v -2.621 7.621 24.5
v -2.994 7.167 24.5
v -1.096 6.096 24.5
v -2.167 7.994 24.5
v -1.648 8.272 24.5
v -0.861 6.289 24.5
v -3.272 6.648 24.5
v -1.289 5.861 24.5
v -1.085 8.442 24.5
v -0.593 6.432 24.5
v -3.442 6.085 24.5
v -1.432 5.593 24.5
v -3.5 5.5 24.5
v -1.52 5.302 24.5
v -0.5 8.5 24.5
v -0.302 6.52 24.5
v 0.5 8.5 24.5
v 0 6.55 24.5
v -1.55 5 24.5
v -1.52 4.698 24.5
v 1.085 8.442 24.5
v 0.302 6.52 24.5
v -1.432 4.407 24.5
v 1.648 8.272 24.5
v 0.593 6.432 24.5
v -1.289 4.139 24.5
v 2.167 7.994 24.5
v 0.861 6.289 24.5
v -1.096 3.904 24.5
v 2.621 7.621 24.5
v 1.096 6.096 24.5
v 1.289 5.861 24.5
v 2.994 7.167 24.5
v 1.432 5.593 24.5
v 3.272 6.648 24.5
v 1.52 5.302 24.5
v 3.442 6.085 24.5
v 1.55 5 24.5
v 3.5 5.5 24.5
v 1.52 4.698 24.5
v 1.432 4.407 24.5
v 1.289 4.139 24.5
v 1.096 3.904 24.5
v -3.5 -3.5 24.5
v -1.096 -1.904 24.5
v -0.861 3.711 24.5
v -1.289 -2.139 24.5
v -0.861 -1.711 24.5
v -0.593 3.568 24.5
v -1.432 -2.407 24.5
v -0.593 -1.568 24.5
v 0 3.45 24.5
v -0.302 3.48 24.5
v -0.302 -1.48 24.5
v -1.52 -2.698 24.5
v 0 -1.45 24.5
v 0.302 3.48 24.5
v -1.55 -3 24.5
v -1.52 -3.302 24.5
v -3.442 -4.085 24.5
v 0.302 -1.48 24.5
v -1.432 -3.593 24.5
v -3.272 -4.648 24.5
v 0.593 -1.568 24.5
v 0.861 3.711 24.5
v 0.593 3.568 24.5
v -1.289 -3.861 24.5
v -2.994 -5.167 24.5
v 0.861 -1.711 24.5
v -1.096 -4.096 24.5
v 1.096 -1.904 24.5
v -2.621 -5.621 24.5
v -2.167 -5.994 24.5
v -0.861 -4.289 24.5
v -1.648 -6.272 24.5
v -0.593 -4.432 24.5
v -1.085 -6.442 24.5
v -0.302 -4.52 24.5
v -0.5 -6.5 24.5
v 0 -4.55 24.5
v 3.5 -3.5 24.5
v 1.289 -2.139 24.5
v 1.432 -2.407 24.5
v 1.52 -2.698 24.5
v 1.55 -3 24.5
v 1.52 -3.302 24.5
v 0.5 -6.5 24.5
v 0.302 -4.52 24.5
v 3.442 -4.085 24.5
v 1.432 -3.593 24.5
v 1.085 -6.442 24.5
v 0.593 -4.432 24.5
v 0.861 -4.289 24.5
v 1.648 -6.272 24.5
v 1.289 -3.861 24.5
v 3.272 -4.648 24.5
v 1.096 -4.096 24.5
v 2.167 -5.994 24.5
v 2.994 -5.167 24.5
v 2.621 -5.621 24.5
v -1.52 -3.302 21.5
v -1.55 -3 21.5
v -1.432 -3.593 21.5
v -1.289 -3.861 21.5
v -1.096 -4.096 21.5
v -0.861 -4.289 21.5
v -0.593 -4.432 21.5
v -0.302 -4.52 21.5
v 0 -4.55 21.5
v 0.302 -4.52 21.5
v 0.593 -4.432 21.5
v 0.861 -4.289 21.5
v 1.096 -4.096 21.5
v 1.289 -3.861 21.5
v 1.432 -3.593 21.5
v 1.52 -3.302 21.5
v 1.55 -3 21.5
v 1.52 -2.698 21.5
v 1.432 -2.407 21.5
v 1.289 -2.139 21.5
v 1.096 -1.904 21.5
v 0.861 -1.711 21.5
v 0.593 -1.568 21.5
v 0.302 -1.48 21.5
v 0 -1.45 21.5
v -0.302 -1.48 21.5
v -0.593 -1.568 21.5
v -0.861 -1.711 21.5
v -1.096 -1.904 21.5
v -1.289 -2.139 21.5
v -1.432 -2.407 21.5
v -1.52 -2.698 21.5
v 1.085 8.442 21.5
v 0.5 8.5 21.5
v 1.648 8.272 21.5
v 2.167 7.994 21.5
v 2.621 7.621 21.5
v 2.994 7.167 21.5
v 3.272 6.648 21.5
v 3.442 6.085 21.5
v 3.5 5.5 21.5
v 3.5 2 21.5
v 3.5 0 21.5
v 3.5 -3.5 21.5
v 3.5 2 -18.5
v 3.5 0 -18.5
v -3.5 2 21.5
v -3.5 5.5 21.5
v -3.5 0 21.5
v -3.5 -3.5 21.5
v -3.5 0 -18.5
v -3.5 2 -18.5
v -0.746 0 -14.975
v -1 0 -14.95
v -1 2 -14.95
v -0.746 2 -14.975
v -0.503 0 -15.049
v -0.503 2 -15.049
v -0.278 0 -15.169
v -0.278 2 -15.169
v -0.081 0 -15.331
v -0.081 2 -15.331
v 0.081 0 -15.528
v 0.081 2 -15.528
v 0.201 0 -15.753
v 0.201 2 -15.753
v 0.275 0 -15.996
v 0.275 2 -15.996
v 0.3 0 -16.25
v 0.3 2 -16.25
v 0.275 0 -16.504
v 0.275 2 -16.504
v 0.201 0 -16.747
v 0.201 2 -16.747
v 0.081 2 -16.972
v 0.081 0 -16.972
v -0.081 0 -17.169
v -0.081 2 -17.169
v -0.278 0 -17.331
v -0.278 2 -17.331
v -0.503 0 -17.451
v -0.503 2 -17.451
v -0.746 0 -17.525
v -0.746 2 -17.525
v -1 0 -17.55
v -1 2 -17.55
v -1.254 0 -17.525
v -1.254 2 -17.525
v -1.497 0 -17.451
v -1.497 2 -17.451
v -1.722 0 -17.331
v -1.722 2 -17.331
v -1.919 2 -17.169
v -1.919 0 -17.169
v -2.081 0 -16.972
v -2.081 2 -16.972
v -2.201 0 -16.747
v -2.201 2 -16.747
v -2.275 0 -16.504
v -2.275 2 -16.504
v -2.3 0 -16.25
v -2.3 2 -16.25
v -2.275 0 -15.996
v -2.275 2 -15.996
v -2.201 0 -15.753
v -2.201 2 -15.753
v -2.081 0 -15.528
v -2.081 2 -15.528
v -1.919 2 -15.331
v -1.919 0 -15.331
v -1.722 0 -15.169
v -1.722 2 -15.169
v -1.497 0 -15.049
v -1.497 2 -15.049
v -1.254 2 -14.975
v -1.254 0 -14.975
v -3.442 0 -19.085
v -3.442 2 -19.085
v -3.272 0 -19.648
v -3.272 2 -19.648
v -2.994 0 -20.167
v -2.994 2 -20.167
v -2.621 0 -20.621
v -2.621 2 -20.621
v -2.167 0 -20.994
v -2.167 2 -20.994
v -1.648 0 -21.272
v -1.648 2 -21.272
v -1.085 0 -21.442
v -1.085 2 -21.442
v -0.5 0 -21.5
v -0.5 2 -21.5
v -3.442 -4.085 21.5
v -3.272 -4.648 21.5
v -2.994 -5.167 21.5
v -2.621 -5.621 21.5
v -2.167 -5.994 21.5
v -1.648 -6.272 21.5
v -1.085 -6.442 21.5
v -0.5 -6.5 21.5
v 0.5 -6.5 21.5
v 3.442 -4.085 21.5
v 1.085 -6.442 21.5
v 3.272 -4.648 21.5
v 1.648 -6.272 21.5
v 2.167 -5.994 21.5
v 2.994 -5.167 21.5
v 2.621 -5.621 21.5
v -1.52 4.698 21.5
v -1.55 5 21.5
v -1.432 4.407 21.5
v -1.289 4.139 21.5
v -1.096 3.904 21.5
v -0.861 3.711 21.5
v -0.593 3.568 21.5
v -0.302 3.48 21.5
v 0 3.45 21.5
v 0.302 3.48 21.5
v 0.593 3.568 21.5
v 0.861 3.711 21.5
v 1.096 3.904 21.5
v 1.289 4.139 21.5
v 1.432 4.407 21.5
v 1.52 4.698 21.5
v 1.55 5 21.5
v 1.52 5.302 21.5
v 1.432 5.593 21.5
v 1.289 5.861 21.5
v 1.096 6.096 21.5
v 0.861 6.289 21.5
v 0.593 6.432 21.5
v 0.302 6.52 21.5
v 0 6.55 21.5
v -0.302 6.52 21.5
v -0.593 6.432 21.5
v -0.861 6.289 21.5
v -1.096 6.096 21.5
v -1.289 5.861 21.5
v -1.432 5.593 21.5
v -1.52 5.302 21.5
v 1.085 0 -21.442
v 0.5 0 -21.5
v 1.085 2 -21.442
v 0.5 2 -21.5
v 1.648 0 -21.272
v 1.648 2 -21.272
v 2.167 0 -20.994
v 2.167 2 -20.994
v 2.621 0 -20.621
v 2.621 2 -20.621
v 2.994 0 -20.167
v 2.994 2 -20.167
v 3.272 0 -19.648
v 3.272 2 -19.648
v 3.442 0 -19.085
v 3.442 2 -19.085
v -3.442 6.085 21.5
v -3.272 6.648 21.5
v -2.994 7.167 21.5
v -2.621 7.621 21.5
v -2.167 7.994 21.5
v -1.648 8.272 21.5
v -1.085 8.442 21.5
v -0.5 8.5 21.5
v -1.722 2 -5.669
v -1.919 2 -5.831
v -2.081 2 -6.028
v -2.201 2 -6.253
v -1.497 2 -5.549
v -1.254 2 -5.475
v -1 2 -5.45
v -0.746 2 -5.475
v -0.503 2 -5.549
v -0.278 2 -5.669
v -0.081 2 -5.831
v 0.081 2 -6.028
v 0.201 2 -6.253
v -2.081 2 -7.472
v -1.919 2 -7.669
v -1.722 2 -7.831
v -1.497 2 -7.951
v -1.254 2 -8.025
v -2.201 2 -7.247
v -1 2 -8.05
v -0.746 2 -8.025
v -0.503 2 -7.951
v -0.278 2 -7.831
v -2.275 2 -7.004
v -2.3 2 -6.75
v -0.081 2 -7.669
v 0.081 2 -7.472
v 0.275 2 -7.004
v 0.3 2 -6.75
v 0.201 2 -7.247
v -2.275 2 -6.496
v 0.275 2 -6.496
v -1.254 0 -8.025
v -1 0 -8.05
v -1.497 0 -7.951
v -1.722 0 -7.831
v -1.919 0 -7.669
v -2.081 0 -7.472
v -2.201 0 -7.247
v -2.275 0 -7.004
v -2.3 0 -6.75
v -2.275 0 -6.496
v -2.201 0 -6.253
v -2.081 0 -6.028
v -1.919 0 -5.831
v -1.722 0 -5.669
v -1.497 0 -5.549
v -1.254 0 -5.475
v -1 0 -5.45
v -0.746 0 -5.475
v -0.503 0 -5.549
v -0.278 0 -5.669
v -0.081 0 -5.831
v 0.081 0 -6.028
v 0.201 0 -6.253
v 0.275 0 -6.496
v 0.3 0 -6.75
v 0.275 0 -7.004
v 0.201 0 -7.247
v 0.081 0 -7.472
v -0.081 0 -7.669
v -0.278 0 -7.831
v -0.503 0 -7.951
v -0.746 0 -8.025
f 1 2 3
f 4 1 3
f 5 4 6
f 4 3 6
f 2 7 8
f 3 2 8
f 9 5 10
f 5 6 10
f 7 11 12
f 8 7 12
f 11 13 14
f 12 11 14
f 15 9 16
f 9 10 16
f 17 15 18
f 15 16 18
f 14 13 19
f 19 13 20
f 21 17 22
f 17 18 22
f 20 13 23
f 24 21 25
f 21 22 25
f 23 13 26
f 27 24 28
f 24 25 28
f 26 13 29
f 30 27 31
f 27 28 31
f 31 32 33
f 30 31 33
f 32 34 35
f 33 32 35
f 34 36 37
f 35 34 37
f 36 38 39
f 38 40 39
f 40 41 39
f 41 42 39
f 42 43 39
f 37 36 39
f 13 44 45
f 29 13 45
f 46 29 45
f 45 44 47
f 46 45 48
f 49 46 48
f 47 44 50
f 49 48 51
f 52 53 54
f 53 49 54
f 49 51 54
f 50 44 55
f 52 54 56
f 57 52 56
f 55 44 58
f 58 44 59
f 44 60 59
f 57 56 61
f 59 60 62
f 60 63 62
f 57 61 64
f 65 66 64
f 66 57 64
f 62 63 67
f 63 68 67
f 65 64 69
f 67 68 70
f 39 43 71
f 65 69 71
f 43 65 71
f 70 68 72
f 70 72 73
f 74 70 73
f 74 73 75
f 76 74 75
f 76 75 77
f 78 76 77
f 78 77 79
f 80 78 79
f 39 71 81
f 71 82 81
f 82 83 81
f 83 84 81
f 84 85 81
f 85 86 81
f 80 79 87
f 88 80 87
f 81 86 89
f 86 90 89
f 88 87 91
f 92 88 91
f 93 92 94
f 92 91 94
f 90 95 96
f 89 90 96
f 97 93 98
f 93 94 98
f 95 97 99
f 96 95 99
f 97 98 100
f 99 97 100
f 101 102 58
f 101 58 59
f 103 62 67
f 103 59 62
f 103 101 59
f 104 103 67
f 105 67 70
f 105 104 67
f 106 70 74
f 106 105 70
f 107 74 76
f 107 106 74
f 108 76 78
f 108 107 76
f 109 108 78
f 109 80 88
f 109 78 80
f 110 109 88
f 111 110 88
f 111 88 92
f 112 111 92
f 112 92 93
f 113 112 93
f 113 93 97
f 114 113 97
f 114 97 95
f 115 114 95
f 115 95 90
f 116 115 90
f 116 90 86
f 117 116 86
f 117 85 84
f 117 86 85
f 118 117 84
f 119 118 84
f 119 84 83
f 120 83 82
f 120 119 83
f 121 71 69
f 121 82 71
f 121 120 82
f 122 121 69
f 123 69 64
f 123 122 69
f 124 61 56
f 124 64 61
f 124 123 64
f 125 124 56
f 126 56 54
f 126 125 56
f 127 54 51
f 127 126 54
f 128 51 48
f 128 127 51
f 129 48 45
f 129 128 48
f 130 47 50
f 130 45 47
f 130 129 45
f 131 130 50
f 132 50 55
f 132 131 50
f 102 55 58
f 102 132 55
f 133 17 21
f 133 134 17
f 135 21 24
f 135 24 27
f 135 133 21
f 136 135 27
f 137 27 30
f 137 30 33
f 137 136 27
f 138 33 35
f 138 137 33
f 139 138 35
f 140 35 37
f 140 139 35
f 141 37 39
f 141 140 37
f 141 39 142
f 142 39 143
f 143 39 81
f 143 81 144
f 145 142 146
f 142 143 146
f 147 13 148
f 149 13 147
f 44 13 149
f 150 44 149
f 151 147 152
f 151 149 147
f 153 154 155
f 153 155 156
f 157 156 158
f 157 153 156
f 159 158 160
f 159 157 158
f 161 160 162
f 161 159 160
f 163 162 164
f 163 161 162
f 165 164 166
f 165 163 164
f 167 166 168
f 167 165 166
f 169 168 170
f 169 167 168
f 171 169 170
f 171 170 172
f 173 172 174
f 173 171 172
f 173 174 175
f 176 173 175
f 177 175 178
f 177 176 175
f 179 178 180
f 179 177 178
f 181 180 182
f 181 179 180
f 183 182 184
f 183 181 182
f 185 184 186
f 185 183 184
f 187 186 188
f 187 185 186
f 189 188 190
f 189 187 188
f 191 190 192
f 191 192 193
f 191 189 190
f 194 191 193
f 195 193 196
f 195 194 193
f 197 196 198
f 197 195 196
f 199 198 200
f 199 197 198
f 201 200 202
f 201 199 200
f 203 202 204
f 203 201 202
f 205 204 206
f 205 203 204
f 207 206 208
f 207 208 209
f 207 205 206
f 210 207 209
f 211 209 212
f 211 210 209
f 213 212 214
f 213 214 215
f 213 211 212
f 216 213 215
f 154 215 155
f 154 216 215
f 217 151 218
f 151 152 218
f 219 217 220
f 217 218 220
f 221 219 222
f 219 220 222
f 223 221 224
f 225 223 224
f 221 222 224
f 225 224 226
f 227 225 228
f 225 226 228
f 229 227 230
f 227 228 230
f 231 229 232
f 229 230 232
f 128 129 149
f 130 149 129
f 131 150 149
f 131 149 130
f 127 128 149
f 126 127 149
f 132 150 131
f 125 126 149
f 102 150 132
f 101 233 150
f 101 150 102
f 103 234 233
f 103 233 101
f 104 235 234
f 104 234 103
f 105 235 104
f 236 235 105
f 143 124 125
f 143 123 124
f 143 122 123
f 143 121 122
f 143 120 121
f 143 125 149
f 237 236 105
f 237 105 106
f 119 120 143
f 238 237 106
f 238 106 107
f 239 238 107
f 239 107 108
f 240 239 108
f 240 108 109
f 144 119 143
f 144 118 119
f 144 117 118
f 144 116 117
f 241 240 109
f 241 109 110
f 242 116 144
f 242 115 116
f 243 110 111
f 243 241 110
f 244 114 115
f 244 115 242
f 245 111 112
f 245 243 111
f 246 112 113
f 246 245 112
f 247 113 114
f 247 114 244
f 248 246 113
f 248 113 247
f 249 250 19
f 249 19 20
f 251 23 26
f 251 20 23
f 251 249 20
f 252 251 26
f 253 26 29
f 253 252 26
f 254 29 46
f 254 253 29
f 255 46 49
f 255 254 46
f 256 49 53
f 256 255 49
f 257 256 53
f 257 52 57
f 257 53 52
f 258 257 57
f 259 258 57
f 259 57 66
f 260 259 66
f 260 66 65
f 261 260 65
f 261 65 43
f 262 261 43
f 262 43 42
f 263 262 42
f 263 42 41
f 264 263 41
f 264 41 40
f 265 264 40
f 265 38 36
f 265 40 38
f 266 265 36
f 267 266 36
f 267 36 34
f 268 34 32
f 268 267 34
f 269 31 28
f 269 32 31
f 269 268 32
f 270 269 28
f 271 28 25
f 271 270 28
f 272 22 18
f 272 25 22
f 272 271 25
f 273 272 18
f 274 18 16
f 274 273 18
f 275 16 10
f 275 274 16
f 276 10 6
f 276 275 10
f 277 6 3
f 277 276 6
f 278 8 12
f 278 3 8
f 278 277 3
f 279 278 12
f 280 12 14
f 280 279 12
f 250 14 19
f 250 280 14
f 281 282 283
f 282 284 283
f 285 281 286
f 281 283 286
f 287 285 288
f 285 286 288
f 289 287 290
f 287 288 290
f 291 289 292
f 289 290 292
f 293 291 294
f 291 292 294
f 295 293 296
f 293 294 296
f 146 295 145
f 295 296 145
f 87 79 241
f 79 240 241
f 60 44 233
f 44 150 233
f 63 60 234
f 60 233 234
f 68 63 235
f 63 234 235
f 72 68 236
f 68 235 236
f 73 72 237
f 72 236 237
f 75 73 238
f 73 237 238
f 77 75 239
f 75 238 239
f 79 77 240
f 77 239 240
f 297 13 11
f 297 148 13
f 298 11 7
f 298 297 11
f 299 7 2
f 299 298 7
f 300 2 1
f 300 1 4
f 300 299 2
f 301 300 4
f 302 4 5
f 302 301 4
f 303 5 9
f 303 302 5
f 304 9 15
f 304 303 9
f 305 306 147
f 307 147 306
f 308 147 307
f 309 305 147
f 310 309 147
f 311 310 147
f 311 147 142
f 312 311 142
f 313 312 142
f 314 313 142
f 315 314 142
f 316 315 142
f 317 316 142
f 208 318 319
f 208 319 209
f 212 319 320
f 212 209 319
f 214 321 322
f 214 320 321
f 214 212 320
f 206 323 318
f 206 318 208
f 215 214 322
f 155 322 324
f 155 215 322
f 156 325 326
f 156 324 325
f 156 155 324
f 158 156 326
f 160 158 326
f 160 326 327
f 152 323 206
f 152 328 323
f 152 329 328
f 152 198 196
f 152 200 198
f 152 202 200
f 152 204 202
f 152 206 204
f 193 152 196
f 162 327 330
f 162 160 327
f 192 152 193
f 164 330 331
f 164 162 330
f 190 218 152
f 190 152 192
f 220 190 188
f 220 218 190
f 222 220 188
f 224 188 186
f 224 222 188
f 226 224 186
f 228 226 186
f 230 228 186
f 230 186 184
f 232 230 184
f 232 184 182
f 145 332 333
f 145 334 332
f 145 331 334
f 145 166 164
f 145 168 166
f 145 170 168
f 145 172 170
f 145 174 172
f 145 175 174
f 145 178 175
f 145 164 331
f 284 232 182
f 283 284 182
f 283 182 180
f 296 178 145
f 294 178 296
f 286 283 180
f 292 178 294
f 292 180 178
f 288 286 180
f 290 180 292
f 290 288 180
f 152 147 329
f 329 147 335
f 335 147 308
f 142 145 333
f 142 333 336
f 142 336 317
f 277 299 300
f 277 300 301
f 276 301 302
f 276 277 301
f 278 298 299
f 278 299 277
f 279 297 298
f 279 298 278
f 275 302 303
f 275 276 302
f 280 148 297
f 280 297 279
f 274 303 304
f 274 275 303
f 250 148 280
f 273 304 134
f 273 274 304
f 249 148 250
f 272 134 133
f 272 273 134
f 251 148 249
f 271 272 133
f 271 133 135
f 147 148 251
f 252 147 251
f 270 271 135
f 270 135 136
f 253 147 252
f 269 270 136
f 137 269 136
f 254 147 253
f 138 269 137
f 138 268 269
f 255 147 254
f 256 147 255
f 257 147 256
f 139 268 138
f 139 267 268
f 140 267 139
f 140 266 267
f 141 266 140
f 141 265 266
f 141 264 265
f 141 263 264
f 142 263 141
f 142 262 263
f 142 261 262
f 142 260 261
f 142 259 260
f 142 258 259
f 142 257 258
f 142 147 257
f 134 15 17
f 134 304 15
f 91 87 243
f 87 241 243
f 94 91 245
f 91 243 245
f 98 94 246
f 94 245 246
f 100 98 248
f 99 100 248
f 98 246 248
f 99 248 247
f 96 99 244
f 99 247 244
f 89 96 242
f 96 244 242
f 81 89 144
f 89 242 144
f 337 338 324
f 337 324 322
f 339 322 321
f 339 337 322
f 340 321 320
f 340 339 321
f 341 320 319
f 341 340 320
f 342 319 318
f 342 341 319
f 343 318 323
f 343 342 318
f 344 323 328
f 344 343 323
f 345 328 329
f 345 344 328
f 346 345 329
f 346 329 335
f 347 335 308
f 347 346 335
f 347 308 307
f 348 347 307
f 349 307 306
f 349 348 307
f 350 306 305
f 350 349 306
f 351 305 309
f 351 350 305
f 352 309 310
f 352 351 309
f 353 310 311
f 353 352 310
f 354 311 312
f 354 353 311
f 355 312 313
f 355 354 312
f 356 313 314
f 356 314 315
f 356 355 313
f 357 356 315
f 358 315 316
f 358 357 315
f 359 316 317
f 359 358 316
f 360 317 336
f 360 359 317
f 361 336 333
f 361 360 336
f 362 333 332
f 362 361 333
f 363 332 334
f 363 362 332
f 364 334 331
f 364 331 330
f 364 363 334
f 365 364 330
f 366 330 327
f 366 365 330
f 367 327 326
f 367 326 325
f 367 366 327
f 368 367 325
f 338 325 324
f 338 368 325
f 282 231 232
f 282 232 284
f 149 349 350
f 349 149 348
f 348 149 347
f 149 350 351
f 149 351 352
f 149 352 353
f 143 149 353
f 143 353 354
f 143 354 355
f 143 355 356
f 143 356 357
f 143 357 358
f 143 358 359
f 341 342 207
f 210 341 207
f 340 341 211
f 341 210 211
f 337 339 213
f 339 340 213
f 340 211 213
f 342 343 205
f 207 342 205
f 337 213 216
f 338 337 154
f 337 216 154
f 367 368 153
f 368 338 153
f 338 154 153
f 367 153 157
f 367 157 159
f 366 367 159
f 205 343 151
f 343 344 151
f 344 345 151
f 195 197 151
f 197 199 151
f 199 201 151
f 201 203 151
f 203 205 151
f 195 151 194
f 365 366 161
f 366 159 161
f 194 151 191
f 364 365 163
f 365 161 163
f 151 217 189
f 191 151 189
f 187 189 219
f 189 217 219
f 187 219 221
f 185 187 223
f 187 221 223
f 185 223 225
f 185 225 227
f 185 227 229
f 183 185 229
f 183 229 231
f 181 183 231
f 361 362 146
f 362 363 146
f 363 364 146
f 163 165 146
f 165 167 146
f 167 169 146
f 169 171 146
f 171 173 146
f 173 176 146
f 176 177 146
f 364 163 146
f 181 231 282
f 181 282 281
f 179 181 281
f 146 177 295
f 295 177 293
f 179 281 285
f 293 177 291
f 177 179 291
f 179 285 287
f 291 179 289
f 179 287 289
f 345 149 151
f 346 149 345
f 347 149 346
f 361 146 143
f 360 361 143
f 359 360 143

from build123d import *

# Parameters (mm, degrees)
SKETCH_1_W           = 7
SKETCH_1_H           = 43
SKETCH_1_R           = 1.3
EXTRUDE_1_DEPTH      = 2
EXTRUDE_2_DEPTH      = 8.5
EXTRUDE_2_DEPTH_BACK = 6.5
SKETCH_2_W           = 7
SKETCH_2_H           = 3
SKETCH_3_R           = 1.55
CUT_EXTRUDE_1_DEPTH  = 27.167728216
FILLET_1_R           = 3
FILLET_2_R           = 3


with BuildPart() as part:
    # 草图1 → 凸台-拉伸1 (new body)
    with BuildSketch(Plane(origin=(0, 0, 0), x_dir=(1, 0, 0), z_dir=(0, 1, 0))):
        Rectangle(SKETCH_1_W, SKETCH_1_H)
        with Locations(Location((-1, 16.25, 0), (0, 0, 270))):
            Circle(SKETCH_1_R, mode=Mode.SUBTRACT)
        with Locations(Location((-1, 6.75, 0), (0, 0, 90))):
            Circle(SKETCH_1_R, mode=Mode.SUBTRACT)
    extrude(amount=EXTRUDE_1_DEPTH)

    # 草图2 → 凸台-拉伸2 (add, two sides: drawn at the far end of the back side and taken through both)
    with BuildSketch(Plane(origin=(0, 0, 0), x_dir=(1, 0, 0), z_dir=(0, 1, 0)).offset(-EXTRUDE_2_DEPTH_BACK)):
        with Locations((0, -23)):
            Rectangle(SKETCH_2_W, SKETCH_2_H)
    extrude(amount=EXTRUDE_2_DEPTH + EXTRUDE_2_DEPTH_BACK)

    # 草图3 → 切除-拉伸1 (cut, through all)
    with BuildSketch(Plane.XY):
        with Locations(Location((0, 5, 0), (0, 0, 180))):
            Circle(SKETCH_3_R)
        with Locations(Location((0, -3, 0), (0, 0, 180))):
            Circle(SKETCH_3_R)
    extrude(amount=CUT_EXTRUDE_1_DEPTH, mode=Mode.SUBTRACT)

    # 圆角1
    fillet_1_edges = [part.edges().sort_by_distance(p)[0] for p in [
        (-3.5, 1, -21.5),
        (3.5, 1, -21.5),
    ]]
    fillet(fillet_1_edges, radius=FILLET_1_R)

    # 圆角2
    fillet_2_edges = [part.edges().sort_by_distance(p)[0] for p in [
        (3.5, -6.5, 23),
        (-3.5, -6.5, 23),
        (3.5, 8.5, 23),
        (-3.5, 8.5, 23),
    ]]
    fillet(fillet_2_edges, radius=FILLET_2_R)


solid = part.part
